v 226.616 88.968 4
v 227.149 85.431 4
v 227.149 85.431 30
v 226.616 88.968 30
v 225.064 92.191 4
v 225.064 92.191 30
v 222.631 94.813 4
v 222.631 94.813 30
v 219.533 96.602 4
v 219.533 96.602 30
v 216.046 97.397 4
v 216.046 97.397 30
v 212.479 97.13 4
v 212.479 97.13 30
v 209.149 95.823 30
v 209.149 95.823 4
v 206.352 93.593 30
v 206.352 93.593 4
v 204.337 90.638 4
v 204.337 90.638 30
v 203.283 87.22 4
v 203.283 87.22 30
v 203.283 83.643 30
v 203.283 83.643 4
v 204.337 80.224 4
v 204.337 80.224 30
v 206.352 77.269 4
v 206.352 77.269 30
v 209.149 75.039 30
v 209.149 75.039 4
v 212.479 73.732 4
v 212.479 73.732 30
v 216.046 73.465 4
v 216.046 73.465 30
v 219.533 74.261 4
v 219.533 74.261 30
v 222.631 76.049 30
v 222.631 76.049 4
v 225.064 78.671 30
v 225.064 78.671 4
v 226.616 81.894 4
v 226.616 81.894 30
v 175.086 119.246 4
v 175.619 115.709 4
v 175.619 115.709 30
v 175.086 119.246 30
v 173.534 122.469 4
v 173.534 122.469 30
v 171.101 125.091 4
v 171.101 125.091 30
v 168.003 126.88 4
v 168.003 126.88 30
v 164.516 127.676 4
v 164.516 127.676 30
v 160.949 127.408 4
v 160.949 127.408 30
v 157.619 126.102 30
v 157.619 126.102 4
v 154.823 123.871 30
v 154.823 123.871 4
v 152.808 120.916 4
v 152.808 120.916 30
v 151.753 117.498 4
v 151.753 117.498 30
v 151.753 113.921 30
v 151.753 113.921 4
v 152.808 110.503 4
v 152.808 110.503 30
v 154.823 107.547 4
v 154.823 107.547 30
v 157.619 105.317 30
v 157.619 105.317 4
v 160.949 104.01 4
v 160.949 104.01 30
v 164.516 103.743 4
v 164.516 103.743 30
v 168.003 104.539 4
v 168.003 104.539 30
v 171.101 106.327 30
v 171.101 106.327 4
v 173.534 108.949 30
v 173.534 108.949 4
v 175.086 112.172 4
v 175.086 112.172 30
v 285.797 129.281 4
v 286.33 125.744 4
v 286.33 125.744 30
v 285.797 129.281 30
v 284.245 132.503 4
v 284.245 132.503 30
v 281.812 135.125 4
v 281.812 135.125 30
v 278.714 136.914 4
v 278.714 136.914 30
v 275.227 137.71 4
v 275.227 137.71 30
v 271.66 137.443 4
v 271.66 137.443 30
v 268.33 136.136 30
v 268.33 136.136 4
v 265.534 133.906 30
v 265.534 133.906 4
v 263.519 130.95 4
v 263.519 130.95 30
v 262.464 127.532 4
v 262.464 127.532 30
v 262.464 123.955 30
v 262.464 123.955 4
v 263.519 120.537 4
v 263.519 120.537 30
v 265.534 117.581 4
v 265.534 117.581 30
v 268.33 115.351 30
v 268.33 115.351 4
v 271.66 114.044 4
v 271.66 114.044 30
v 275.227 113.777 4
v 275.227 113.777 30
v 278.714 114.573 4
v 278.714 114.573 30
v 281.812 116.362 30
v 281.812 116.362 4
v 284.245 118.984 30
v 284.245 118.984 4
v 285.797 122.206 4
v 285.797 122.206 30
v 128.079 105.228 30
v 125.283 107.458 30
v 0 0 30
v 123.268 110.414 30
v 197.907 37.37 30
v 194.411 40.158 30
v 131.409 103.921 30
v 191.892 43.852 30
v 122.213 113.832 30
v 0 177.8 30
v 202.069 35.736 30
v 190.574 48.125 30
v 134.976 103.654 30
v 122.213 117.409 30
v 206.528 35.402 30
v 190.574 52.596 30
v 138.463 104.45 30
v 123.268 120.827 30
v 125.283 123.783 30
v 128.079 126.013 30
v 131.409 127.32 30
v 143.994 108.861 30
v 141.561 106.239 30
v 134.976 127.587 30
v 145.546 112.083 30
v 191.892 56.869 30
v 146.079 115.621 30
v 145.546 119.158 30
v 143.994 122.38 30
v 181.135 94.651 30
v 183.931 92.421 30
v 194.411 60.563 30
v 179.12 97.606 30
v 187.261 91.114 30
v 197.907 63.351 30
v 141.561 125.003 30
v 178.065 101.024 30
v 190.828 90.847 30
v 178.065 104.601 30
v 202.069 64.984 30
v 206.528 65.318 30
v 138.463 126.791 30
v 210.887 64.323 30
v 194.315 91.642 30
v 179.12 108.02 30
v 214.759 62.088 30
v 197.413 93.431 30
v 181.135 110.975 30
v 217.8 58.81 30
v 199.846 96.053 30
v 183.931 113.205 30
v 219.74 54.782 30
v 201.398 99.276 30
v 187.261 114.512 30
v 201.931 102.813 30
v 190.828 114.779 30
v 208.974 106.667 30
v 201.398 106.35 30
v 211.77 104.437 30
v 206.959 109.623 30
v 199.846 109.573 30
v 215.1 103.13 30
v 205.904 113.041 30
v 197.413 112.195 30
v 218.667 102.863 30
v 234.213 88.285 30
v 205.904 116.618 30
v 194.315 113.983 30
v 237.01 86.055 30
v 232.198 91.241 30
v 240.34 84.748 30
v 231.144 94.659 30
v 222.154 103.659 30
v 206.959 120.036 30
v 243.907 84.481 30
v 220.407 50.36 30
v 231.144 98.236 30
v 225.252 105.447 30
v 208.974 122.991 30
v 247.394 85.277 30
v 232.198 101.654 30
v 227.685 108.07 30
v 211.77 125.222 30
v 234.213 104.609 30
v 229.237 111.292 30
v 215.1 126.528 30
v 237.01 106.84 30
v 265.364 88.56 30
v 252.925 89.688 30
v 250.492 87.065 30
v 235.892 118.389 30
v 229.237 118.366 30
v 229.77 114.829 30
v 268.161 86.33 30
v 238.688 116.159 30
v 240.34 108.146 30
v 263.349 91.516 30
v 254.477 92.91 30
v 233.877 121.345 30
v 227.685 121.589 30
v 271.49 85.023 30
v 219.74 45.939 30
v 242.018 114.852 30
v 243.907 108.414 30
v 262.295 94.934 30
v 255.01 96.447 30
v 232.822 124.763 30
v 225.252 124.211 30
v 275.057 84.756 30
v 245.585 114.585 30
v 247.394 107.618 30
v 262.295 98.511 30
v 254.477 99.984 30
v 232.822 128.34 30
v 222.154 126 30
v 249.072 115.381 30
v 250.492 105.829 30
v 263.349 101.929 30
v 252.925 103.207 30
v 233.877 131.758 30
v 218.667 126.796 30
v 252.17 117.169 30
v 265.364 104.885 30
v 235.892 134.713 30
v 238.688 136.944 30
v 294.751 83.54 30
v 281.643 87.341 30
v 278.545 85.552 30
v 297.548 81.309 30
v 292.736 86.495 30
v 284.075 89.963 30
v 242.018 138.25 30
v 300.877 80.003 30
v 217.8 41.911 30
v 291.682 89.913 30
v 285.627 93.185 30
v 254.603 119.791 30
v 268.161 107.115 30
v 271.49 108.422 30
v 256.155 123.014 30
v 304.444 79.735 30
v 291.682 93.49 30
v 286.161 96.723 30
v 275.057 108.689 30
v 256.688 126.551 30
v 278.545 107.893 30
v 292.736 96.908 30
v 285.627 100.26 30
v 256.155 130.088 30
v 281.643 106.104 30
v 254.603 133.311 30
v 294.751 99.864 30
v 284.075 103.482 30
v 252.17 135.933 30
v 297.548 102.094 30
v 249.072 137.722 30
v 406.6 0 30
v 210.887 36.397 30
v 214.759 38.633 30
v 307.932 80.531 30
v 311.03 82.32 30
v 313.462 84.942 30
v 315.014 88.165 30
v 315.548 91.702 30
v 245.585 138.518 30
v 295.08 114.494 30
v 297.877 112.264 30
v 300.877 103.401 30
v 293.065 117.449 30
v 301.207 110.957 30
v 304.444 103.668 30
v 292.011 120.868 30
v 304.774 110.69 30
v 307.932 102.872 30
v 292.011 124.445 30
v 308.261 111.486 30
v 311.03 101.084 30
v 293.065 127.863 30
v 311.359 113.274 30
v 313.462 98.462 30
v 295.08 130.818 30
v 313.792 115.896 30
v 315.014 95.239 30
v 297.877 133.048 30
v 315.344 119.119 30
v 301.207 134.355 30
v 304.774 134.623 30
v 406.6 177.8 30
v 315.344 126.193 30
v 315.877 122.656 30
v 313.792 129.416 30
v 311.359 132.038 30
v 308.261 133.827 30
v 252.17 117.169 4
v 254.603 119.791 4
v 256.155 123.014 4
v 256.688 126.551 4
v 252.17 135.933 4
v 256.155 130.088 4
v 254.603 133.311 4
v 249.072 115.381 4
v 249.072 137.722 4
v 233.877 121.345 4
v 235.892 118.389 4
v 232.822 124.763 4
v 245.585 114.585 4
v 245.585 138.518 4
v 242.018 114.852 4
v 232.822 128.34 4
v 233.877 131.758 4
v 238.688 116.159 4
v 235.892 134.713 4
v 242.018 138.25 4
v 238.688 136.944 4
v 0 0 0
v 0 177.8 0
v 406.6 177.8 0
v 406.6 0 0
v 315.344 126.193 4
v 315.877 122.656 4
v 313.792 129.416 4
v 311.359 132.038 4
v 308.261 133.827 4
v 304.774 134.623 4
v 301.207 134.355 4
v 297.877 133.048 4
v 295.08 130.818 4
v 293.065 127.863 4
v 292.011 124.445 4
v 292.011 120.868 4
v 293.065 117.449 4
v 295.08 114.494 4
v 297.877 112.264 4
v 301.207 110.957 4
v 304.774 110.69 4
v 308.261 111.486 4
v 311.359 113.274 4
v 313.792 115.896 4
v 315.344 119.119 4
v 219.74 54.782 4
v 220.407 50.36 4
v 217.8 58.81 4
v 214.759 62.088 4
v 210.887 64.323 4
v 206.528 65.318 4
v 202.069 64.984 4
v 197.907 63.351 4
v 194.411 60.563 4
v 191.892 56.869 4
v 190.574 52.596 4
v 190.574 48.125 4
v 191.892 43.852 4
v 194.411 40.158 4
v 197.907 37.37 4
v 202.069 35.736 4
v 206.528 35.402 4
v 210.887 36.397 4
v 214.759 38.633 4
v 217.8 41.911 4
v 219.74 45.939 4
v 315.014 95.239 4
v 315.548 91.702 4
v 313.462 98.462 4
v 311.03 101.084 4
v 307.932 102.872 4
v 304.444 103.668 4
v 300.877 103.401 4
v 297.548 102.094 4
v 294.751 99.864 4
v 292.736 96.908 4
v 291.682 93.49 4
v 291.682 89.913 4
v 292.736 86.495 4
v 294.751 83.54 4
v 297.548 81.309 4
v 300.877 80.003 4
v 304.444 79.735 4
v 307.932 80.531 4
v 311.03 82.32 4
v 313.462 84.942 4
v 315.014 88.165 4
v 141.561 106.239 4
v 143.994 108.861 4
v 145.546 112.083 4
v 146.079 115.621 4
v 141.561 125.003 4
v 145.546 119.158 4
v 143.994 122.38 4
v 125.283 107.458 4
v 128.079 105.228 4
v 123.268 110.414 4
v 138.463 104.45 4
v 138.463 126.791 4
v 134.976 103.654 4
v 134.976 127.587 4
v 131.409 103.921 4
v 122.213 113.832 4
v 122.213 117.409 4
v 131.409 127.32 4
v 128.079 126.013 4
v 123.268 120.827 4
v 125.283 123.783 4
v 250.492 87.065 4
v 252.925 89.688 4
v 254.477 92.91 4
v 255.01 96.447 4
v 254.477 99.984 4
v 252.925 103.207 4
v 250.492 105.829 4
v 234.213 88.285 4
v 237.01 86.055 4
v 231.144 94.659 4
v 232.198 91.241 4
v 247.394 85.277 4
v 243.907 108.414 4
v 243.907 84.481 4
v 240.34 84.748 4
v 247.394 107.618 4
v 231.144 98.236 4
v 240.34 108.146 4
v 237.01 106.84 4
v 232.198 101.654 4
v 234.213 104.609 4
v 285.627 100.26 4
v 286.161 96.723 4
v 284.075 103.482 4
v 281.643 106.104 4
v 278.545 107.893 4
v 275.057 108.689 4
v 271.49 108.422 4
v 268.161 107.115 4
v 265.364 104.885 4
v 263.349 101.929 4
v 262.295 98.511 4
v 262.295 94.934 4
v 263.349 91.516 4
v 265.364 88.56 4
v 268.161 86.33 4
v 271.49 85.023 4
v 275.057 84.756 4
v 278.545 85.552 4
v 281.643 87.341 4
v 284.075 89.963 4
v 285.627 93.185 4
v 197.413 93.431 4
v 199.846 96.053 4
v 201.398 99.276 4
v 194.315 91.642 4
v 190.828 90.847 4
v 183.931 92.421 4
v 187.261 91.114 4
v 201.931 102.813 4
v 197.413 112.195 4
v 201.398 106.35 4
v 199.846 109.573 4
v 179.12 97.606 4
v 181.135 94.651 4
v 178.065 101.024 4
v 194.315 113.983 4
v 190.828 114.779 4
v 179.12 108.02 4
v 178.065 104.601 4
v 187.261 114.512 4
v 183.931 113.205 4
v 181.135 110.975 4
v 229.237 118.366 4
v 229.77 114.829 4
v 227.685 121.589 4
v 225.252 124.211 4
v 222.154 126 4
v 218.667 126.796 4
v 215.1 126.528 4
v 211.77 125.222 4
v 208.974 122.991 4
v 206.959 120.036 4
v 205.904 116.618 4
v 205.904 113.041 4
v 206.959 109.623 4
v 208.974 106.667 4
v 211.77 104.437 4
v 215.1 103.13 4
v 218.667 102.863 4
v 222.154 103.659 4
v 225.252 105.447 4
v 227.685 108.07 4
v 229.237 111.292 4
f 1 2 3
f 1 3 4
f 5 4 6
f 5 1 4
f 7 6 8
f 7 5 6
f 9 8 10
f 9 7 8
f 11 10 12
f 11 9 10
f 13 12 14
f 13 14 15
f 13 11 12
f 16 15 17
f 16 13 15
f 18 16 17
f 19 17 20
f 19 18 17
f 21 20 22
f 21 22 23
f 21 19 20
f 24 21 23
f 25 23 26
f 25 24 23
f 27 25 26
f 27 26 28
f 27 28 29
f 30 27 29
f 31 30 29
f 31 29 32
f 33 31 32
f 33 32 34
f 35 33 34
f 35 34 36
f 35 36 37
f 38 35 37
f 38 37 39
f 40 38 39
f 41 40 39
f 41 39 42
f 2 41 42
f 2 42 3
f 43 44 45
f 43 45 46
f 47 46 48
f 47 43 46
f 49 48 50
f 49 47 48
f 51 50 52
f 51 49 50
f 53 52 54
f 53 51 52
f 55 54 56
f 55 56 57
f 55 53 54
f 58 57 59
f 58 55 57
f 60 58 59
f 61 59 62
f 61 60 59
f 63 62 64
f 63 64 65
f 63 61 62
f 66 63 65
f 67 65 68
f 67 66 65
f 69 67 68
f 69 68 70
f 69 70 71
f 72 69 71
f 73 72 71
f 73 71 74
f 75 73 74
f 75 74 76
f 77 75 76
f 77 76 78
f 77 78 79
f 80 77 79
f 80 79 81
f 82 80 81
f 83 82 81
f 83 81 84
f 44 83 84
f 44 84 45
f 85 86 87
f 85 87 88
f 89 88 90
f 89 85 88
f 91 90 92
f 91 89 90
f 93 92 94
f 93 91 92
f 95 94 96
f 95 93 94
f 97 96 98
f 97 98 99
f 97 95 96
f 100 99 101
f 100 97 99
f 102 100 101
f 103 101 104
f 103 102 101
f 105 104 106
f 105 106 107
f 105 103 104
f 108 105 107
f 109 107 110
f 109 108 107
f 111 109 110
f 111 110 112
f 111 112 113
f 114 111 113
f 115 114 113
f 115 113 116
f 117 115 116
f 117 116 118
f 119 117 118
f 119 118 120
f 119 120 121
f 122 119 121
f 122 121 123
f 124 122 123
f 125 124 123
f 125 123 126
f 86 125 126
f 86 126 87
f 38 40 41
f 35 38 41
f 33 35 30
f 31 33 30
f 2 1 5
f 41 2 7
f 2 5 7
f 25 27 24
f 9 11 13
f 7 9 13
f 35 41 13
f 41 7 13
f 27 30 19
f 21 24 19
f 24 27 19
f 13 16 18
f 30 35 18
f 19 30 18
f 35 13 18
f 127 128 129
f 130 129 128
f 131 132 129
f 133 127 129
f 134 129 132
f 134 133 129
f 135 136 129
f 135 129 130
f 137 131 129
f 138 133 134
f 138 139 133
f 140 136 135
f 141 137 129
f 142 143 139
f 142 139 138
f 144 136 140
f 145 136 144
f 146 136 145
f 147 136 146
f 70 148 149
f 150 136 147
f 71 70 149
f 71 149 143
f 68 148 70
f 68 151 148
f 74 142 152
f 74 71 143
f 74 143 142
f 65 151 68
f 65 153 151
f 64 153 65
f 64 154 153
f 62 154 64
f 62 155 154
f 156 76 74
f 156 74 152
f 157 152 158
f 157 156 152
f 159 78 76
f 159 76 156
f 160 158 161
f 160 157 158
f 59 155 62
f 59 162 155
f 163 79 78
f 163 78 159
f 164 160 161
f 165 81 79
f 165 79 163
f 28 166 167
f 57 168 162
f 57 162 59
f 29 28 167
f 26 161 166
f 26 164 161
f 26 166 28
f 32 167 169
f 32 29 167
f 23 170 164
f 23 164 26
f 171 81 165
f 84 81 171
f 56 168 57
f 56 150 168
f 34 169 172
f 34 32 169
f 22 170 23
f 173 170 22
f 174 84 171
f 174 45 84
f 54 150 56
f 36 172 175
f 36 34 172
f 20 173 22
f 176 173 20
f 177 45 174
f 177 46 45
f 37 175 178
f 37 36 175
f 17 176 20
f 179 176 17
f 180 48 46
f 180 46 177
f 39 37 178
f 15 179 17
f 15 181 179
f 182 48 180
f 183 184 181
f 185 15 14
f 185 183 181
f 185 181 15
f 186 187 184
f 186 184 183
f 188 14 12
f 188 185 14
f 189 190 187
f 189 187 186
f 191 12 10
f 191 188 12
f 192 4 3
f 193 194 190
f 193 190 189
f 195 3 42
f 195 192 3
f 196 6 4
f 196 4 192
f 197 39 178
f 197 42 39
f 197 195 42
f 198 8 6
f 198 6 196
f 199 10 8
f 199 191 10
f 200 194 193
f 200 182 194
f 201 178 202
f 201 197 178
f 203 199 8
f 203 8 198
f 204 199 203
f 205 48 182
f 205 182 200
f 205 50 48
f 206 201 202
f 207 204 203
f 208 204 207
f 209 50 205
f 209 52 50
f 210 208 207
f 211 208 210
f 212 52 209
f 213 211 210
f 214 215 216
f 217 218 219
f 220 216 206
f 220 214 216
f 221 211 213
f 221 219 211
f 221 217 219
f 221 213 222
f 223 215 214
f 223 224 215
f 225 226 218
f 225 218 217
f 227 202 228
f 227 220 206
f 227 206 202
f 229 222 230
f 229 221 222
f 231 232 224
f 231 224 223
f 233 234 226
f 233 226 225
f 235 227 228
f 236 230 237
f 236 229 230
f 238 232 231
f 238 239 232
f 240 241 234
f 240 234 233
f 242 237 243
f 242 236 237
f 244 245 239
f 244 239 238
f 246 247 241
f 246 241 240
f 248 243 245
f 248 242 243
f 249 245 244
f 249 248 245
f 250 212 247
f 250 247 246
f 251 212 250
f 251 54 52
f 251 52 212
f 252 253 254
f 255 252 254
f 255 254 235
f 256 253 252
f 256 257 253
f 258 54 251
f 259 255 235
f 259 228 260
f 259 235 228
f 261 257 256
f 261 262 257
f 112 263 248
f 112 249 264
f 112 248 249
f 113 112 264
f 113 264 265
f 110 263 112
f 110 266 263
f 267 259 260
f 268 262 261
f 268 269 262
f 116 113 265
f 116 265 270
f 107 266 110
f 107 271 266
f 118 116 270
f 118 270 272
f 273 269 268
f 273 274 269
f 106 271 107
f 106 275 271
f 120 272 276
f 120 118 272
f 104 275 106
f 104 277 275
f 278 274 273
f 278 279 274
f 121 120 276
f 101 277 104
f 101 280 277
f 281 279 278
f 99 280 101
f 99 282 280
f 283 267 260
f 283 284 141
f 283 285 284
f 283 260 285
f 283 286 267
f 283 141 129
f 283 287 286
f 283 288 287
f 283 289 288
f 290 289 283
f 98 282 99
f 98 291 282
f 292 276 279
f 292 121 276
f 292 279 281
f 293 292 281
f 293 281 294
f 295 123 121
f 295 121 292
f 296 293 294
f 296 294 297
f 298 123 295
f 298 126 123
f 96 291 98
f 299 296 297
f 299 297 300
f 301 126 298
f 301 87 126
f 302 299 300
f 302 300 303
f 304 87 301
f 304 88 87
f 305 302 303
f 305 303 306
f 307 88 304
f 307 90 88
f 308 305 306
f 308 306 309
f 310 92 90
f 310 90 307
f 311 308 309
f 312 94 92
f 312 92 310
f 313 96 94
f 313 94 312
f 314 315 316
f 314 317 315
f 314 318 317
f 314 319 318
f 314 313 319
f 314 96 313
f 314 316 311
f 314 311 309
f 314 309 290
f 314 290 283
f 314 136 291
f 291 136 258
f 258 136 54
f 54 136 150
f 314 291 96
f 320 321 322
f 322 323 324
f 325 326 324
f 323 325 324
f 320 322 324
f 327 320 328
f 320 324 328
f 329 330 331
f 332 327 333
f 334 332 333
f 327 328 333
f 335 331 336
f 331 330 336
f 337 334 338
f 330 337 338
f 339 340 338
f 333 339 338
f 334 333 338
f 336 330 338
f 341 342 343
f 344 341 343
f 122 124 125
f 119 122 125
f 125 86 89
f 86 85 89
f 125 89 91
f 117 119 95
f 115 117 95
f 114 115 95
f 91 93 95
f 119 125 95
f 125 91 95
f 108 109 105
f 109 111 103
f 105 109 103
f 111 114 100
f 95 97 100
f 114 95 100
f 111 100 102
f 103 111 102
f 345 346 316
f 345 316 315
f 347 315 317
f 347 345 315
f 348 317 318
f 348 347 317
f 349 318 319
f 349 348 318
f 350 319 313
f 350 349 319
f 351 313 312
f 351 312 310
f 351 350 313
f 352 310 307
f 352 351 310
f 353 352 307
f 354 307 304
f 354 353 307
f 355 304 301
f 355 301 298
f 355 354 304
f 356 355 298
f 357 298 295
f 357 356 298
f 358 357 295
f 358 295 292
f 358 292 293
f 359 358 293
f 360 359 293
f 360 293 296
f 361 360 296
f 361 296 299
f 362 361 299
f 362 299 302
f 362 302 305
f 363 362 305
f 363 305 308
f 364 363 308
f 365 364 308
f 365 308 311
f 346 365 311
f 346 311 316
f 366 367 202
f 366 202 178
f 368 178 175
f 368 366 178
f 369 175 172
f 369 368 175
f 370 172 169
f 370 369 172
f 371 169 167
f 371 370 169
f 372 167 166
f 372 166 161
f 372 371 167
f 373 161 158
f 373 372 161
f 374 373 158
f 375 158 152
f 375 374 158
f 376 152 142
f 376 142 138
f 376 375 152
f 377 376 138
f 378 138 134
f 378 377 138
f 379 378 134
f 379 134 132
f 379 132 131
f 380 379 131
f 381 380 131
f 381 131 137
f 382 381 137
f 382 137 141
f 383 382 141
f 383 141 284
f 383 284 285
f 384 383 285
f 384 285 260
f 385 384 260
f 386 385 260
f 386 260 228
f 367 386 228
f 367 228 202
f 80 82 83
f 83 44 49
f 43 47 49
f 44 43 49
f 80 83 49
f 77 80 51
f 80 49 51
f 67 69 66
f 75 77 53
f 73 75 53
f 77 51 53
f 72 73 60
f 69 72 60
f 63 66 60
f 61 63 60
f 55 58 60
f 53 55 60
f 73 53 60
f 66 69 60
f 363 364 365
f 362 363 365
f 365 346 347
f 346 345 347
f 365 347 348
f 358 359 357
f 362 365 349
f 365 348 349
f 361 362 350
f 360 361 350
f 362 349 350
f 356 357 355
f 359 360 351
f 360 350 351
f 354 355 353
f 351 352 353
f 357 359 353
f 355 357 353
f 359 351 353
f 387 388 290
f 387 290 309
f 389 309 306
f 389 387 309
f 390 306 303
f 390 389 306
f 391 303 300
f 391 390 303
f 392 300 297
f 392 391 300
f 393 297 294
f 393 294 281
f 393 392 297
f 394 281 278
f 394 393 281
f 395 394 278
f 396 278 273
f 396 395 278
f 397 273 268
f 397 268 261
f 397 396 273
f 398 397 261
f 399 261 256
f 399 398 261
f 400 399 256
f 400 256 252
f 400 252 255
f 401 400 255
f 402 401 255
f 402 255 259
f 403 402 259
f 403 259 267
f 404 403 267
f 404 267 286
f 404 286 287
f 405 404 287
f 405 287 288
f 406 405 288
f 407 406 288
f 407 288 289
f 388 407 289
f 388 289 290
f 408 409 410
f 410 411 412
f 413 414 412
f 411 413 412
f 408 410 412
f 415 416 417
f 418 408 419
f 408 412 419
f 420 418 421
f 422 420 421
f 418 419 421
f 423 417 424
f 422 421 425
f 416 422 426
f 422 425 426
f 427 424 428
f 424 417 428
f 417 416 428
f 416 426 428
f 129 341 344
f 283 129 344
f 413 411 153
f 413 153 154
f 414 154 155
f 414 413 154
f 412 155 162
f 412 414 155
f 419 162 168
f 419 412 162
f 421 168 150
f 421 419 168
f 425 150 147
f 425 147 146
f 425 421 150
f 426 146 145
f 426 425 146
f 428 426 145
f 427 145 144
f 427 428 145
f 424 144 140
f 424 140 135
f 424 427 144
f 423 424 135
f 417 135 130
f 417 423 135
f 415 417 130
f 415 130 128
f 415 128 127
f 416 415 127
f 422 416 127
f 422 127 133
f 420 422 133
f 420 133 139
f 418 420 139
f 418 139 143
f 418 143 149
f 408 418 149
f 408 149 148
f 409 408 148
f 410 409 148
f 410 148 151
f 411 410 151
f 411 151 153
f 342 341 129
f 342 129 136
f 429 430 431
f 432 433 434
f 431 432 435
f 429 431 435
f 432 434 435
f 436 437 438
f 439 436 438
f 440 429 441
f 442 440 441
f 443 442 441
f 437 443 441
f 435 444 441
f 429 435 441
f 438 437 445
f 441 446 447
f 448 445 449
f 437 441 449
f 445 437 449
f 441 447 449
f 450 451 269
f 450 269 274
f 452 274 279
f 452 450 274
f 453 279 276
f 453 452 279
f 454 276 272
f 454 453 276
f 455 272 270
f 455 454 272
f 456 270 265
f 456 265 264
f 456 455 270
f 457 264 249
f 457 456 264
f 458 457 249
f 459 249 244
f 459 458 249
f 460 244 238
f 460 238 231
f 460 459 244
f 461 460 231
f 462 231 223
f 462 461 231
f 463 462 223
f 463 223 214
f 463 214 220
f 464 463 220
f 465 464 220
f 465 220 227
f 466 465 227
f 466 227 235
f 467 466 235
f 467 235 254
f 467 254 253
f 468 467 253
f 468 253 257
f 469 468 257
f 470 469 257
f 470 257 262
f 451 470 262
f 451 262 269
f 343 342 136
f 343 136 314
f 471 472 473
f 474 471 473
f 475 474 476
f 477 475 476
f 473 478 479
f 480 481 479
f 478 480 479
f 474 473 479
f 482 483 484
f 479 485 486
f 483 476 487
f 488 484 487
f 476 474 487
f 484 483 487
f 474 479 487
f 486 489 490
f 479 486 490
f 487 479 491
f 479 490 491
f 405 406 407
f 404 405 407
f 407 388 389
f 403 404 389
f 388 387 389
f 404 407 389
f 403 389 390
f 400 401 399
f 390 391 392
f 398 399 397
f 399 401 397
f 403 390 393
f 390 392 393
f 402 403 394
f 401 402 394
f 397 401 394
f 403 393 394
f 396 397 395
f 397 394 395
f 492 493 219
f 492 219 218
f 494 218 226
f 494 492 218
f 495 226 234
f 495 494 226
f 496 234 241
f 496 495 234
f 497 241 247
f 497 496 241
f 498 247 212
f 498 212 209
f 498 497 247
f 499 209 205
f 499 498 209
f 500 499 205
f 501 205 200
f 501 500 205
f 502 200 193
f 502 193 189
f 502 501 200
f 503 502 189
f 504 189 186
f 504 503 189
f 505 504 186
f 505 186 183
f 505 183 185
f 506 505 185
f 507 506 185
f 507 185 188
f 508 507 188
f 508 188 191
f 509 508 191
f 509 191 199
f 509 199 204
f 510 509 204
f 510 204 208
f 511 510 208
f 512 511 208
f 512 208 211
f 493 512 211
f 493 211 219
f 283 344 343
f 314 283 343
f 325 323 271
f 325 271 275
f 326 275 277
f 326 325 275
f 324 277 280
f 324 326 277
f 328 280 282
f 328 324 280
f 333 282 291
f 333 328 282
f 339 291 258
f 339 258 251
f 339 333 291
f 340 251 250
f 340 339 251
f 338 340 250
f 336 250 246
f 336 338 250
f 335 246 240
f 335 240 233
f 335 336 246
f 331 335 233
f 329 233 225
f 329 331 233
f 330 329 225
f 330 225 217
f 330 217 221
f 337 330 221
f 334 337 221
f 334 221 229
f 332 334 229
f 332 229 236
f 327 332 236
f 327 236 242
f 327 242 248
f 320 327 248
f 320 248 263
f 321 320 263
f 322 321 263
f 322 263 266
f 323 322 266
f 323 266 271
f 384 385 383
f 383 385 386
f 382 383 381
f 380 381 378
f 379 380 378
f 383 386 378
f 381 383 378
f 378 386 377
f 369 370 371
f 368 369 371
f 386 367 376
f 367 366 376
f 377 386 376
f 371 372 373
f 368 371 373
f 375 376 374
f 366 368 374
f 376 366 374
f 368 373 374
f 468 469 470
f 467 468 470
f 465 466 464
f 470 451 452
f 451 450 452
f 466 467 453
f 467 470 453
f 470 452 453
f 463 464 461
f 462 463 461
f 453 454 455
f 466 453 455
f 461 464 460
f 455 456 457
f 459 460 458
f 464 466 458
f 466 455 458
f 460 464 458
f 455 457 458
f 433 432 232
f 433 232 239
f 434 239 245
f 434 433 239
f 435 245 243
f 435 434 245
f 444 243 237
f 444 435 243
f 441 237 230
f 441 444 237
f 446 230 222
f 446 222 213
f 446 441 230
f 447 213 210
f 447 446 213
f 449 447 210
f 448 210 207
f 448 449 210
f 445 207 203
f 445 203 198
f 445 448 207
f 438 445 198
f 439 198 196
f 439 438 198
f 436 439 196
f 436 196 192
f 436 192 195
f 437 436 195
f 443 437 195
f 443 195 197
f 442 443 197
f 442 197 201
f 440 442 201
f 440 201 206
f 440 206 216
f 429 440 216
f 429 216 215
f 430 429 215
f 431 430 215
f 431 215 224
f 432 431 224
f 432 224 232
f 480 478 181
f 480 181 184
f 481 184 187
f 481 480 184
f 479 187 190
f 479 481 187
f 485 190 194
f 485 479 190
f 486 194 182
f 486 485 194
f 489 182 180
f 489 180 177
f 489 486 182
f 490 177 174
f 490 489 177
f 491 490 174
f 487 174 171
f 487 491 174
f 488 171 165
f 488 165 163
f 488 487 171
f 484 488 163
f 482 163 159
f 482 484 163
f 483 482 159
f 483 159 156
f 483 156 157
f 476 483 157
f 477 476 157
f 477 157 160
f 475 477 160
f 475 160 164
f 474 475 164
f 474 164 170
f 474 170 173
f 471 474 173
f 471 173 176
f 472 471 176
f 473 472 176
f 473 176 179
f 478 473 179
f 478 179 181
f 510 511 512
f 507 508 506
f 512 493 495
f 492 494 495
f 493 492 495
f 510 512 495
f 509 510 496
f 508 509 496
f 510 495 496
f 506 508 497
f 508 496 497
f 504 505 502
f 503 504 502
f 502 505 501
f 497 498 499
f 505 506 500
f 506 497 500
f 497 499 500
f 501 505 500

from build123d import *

# Parameters (mm, degrees)
ESQUISSE2_W        = 406.6
ESQUISSE2_H        = 177.8
ESQUISSE2_R        = 12
ESQUISSE2_R_2      = 15
BOSS_EXTRU_3_DEPTH = 30
ESQUISSE4_W        = 406.6
ESQUISSE4_H        = 177.8
BOSS_EXTRU_4_DEPTH = 4


with BuildPart() as part:
    # Esquisse2 → Boss.-Extru.3 (new body)
    with BuildSketch(Plane.XY):
        with Locations((203.3, 88.9)):
            Rectangle(ESQUISSE2_W, ESQUISSE2_H)
        with Locations((134.07925081, 115.620543461)):
            Circle(ESQUISSE2_R, mode=Mode.SUBTRACT)
        with Locations((163.619308258, 115.709309955)):
            Circle(ESQUISSE2_R, mode=Mode.SUBTRACT)
        with Locations((189.931391461, 102.812951429)):
            Circle(ESQUISSE2_R, mode=Mode.SUBTRACT)
        with Locations((215.148770887, 85.431045161)):
            Circle(ESQUISSE2_R, mode=Mode.SUBTRACT)
        with Locations((205.406615555, 50.360364433)):
            Circle(ESQUISSE2_R_2, mode=Mode.SUBTRACT)
        with Locations((217.770290506, 114.829364891)):
            Circle(ESQUISSE2_R, mode=Mode.SUBTRACT)
        with Locations((244.688210229, 126.551247272)):
            Circle(ESQUISSE2_R, mode=Mode.SUBTRACT)
        with Locations((274.33036562, 125.743518948)):
            Circle(ESQUISSE2_R, mode=Mode.SUBTRACT)
        with Locations((303.876863168, 122.656060434)):
            Circle(ESQUISSE2_R, mode=Mode.SUBTRACT)
        with Locations((303.54762398, 91.701693193)):
            Circle(ESQUISSE2_R, mode=Mode.SUBTRACT)
        with Locations((274.160623302, 96.722519891)):
            Circle(ESQUISSE2_R, mode=Mode.SUBTRACT)
        with Locations((243.010025324, 96.447343803)):
            Circle(ESQUISSE2_R, mode=Mode.SUBTRACT)
    extrude(amount=BOSS_EXTRU_3_DEPTH)

    # Esquisse4 → Boss.-Extru.4 (add)
    with BuildSketch(Plane(origin=(0, 0, 0), x_dir=(-1, 0, 0), z_dir=(0, 0, -1))):
        with Locations((-203.3, 88.9)):
            Rectangle(ESQUISSE4_W, ESQUISSE4_H)
    extrude(amount=-BOSS_EXTRU_4_DEPTH)


solid = part.part
